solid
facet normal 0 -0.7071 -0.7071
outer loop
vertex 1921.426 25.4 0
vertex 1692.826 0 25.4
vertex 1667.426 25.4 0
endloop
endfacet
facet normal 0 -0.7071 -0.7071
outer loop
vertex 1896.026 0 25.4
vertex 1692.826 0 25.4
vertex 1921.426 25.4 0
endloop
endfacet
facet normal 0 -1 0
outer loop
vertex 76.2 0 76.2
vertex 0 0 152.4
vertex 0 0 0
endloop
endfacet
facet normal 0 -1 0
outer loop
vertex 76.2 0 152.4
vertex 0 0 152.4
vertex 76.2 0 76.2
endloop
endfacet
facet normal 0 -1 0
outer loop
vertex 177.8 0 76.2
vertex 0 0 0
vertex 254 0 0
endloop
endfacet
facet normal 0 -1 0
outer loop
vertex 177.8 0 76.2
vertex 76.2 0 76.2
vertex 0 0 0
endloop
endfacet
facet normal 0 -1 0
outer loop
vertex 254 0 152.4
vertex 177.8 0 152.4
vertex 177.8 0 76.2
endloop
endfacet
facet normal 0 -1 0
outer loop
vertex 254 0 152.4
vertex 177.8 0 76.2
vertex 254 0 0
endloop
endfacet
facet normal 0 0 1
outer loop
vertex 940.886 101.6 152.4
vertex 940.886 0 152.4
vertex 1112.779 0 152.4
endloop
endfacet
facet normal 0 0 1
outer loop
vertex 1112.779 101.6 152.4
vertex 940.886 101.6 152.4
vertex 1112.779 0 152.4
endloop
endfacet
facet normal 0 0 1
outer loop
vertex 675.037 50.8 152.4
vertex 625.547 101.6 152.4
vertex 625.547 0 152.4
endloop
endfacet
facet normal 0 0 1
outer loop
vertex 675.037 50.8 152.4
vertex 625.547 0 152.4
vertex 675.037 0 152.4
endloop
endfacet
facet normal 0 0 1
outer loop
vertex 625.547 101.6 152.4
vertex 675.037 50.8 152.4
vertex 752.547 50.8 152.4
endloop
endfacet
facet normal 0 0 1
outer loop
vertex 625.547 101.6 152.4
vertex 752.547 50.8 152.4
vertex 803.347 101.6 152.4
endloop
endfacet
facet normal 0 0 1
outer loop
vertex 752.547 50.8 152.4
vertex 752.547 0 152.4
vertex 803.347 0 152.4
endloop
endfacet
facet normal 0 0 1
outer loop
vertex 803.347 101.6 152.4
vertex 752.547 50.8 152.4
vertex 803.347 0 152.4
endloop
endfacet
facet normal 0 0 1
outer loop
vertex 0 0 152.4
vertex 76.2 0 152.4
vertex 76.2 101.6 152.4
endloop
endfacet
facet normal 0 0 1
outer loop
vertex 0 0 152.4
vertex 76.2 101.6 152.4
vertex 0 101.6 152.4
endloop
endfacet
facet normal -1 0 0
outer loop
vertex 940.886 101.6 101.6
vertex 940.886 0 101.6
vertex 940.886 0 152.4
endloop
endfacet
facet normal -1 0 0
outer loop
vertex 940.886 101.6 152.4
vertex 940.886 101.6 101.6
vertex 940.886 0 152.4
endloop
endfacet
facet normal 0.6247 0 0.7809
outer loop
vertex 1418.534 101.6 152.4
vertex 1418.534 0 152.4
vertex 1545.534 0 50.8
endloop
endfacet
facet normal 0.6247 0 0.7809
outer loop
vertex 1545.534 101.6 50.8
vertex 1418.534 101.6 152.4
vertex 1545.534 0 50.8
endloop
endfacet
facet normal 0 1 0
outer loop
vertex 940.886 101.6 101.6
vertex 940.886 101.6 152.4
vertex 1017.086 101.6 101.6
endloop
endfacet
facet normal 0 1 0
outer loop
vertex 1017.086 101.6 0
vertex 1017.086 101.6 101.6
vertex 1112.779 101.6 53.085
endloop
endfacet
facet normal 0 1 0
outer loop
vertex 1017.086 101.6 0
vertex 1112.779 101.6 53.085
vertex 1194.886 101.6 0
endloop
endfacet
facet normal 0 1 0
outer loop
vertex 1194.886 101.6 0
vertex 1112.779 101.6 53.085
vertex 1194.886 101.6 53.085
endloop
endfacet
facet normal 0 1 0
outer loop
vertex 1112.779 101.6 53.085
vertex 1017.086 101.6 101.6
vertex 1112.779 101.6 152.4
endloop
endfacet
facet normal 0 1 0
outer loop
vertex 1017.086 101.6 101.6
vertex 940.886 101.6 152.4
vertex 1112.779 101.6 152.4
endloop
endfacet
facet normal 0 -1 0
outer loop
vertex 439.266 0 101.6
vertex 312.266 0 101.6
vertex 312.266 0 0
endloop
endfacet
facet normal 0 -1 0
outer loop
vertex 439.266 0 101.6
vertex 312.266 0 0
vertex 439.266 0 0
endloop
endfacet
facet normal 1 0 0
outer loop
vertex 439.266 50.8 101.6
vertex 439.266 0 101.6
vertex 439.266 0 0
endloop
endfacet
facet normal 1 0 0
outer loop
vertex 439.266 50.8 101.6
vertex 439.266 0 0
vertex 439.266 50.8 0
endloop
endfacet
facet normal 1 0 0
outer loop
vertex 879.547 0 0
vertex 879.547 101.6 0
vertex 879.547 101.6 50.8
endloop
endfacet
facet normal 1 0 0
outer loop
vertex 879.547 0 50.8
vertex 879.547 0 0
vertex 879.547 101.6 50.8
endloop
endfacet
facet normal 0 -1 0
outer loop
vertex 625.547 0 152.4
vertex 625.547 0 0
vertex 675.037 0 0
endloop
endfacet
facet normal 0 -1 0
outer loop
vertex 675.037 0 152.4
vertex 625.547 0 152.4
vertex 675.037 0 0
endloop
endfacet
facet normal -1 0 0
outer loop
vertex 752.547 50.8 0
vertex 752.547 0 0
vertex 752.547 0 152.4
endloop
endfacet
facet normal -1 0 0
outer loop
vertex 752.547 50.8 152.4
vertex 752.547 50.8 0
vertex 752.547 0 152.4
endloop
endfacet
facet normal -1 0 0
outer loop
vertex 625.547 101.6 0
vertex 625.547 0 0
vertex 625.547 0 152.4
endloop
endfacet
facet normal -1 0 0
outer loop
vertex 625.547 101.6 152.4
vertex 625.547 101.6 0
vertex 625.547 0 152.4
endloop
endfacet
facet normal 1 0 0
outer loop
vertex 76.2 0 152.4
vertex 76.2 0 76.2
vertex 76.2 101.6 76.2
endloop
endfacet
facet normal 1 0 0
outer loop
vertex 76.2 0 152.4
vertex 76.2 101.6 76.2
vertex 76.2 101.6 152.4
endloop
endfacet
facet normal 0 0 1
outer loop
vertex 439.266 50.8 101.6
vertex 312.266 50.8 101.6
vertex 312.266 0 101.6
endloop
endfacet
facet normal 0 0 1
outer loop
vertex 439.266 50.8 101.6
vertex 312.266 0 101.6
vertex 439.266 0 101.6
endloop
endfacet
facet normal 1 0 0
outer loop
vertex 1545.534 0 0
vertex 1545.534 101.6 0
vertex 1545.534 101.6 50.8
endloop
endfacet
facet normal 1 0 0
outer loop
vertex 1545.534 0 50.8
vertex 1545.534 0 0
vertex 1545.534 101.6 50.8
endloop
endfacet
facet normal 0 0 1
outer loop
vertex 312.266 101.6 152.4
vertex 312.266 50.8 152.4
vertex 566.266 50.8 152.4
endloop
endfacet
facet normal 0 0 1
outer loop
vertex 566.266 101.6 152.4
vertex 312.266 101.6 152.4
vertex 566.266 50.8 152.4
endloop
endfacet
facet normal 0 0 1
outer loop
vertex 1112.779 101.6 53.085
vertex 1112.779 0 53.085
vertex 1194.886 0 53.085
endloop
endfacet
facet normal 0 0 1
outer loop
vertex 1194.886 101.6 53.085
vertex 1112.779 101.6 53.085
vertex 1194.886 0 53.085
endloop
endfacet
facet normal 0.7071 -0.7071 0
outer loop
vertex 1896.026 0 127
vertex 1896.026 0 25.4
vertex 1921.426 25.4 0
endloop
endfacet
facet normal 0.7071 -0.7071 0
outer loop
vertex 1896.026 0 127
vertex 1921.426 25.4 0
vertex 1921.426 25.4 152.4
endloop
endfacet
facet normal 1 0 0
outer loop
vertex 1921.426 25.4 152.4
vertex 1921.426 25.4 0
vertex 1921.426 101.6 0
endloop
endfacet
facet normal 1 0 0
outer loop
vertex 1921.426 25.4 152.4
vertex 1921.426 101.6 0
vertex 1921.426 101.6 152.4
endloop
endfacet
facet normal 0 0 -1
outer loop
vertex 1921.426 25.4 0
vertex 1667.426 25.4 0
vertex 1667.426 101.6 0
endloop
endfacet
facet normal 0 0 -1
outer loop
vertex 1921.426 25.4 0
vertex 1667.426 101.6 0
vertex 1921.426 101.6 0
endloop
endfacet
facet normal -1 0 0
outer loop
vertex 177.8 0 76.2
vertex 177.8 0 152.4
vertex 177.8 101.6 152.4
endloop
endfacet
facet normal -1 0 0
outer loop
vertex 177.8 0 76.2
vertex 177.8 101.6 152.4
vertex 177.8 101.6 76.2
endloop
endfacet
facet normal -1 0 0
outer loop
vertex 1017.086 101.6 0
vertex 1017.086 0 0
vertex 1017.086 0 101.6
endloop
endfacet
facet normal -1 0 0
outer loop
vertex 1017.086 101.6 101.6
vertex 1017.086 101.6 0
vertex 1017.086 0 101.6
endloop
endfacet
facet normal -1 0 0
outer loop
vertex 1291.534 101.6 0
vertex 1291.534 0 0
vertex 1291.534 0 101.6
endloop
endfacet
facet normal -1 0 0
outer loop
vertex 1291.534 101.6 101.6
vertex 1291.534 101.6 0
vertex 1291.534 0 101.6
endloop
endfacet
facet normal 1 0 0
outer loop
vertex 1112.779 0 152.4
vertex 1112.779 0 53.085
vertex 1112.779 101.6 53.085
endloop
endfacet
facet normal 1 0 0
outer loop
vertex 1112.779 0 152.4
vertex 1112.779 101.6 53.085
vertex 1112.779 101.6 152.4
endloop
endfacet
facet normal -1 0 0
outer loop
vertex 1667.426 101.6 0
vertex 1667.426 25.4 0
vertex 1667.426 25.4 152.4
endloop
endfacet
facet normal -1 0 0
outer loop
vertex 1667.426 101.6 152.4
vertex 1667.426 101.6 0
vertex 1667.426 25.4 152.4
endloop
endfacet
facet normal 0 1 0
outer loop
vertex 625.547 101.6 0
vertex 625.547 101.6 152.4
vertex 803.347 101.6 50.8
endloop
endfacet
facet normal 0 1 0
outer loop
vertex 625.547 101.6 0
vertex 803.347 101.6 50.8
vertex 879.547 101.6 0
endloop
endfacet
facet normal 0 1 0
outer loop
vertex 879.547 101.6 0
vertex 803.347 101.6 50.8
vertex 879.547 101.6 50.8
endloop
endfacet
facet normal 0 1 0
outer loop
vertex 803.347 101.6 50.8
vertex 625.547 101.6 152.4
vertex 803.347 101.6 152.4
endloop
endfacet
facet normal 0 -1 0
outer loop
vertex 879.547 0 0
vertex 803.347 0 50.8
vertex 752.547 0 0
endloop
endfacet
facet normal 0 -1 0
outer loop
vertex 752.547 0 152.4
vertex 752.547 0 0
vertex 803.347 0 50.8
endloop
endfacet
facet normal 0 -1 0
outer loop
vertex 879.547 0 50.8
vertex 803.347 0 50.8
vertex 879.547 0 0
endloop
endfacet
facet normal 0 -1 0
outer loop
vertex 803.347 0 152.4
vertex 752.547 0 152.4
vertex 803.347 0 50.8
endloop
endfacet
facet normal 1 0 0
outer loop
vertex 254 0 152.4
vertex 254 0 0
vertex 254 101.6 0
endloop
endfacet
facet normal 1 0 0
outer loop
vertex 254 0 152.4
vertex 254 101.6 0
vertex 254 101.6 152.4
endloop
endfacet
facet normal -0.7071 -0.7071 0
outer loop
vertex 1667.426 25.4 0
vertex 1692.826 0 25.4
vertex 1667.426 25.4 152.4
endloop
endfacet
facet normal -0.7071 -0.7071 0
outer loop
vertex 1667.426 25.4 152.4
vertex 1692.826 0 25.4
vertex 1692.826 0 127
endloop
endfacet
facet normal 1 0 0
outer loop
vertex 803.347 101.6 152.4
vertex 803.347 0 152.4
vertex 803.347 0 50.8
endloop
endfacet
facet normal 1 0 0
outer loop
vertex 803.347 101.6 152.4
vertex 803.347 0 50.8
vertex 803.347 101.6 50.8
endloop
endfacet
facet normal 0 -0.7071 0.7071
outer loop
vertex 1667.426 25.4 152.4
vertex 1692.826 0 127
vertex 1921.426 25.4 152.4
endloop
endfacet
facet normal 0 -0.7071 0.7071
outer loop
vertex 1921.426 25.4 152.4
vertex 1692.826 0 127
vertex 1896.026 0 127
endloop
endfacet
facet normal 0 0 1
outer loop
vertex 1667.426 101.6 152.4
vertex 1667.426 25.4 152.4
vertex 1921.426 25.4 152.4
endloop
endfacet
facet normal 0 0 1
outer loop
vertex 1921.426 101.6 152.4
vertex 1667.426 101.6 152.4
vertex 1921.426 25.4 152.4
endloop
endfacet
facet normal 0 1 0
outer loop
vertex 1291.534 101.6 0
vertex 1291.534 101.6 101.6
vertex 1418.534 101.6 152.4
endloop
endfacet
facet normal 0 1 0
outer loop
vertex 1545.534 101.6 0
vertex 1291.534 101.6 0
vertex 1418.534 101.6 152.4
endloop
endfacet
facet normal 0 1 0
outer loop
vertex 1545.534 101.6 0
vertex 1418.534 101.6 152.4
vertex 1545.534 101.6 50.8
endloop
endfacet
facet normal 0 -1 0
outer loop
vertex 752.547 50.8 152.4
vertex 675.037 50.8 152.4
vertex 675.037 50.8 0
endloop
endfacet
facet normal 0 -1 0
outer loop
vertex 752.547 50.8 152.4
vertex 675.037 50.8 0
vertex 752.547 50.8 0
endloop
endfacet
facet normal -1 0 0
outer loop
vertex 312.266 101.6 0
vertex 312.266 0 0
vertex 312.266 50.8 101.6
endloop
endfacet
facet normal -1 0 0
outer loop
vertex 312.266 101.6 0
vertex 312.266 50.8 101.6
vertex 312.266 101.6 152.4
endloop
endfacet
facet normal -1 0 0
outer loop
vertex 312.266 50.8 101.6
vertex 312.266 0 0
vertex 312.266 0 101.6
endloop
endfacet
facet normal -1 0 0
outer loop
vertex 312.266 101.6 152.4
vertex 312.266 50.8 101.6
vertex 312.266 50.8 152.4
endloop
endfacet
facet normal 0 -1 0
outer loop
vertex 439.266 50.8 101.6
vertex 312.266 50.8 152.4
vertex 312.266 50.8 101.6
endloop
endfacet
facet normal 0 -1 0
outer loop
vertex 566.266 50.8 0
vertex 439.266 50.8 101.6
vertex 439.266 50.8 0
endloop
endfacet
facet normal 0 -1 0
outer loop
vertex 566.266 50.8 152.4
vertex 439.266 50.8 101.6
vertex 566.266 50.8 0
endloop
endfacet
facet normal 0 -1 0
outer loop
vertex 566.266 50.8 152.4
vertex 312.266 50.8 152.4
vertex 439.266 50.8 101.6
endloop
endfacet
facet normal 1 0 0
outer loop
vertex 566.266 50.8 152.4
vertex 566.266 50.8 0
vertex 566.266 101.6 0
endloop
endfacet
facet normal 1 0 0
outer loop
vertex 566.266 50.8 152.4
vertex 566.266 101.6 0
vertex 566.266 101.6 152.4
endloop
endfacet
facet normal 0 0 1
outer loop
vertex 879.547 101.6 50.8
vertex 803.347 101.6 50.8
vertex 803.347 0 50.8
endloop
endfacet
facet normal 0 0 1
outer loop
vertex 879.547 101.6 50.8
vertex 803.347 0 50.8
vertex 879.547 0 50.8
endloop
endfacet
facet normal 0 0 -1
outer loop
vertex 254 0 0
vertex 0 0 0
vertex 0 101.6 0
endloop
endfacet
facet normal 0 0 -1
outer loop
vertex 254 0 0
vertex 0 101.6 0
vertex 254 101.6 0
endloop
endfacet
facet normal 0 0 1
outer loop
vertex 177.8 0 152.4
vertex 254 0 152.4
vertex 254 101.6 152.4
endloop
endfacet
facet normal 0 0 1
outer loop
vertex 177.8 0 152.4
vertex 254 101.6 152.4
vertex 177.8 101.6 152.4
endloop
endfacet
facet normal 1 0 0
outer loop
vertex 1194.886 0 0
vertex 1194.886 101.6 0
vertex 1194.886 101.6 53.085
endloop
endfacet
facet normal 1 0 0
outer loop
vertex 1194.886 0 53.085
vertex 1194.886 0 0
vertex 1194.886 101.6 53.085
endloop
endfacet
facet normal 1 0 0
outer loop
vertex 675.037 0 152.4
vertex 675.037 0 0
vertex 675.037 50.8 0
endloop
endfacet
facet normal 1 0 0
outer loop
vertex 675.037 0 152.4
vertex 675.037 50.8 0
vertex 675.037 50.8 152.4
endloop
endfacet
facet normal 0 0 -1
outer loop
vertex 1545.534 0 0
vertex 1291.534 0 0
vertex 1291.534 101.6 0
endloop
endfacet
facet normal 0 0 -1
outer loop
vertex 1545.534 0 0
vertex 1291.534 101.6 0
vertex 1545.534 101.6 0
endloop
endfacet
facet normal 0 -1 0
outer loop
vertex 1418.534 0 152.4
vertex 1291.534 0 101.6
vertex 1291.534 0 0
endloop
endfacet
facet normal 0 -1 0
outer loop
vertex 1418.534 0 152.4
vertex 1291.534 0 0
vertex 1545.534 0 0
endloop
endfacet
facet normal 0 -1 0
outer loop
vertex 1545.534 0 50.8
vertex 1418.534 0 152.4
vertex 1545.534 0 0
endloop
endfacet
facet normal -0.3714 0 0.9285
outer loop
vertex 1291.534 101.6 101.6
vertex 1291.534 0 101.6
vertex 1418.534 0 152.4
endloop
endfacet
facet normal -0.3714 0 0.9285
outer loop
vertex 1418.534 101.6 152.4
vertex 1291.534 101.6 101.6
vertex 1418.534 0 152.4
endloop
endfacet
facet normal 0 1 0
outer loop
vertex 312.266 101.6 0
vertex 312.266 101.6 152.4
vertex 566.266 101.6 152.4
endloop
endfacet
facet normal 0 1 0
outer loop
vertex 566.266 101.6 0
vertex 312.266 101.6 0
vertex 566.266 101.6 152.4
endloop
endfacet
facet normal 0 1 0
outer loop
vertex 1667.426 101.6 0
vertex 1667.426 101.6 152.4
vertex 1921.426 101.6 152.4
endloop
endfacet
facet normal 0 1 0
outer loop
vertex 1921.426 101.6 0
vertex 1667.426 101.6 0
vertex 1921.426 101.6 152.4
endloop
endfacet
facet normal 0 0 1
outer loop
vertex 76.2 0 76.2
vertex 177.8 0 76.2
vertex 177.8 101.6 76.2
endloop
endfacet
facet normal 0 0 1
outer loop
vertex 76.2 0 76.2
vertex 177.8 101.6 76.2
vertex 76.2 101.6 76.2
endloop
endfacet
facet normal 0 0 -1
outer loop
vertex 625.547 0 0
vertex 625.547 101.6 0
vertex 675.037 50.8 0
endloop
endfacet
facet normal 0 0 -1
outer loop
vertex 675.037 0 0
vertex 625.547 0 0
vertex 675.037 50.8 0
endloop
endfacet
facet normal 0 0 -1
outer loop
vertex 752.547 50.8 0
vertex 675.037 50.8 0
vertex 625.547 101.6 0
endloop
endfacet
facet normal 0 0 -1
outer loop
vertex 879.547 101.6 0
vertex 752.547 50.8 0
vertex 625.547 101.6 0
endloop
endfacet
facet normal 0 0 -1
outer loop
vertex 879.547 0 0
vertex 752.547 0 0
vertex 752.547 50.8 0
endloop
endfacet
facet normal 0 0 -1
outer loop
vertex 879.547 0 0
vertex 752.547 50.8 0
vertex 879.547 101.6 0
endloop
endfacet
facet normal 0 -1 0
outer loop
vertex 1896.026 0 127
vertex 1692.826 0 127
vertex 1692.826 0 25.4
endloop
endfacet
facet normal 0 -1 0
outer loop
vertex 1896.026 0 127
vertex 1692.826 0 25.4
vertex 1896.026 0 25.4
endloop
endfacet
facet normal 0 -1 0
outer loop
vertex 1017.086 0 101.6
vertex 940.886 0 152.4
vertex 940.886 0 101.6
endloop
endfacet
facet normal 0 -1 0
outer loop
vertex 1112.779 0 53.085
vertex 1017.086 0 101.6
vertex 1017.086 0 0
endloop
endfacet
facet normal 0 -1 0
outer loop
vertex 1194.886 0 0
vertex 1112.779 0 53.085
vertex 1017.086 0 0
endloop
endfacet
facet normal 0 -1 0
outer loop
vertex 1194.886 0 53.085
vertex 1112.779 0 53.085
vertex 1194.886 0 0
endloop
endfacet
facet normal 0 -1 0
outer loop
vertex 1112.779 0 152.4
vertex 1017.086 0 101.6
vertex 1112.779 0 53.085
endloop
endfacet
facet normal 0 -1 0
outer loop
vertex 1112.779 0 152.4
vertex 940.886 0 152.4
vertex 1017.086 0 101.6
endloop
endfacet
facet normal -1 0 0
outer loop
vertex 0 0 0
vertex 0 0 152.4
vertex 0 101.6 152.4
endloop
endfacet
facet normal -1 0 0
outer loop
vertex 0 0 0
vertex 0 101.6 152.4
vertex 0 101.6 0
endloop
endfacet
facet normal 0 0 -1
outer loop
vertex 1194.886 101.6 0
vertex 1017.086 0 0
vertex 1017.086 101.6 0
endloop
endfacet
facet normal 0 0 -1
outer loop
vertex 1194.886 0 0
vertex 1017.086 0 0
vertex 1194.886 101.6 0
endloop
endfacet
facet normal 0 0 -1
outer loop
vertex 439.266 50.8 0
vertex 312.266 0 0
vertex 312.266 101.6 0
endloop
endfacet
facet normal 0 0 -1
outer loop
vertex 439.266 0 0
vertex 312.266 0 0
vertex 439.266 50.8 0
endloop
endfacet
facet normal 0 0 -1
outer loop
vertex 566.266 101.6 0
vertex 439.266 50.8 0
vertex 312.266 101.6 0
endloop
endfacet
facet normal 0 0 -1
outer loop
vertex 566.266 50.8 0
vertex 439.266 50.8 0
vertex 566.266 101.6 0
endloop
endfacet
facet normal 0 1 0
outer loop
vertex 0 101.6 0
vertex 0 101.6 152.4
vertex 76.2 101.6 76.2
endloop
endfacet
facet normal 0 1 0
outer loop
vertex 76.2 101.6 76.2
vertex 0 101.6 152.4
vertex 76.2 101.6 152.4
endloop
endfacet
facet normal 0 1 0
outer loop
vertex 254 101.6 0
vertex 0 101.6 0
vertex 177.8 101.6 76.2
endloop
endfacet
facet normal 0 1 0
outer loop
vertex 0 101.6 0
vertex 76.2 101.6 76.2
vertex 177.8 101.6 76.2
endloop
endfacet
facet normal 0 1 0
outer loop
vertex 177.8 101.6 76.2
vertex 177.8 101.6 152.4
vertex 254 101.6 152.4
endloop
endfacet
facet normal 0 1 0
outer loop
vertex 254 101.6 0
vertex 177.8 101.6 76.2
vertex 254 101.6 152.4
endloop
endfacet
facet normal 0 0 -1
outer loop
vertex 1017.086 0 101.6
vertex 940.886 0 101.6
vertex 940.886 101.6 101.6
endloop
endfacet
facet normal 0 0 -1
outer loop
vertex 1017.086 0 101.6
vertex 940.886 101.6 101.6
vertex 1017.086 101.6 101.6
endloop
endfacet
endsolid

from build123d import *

# Parameters (mm, degrees)
F1_DEPTH  = 101.6
F2_W      = 254
F2_H      = 152.4
F3_DEPTH  = 101.6
F4_W      = 127
F4_H      = 50.8
F5_DEPTH  = 152.4
F7_W      = 127
F7_H      = 50.8
F8_DEPTH  = 50.8
F6_W      = 254
F6_H      = 152.4
F9_DEPTH  = 101.6
F10_W     = 76.2
F10_H     = 101.6
F11_DEPTH = 101.6
F12_W     = 77.5092818909
F12_H     = 152.4
F13_DEPTH = 50.8
F14_W     = 254
F14_H     = 152.4
F15_DEPTH = 101.6
F16_W     = 76.2
F16_H     = 101.6
F17_DEPTH = 101.6
F18_W     = 82.1068286896
F18_H     = 99.315268898
F19_DEPTH = 101.6
F20_W     = 254
F20_H     = 152.4
F21_DEPTH = 101.6
F23_DEPTH = 101.6
F25_DEPTH = 101.6
F26_W     = 254
F26_H     = 152.4
F27_DEPTH = 101.6
F28_SIZE  = 25.4


with BuildPart() as f1:
    # F0 (on Front) → F1 (new body)
    with BuildSketch(Plane.XZ):
        Polygon((0, 152.4), (0, 0), (254, 0), (254, 152.4), (177.8, 152.4), (177.8, 76.2), (76.2, 76.2), (76.2, 152.4), align=None)
    extrude(amount=-F1_DEPTH)


with BuildPart() as f3:
    # F2 (on face) → F3 (new body)
    with BuildSketch(Plane.XZ):
        with Locations((439.2663795948, 76.2)):
            Rectangle(F2_W, F2_H)
    extrude(amount=-F3_DEPTH)

    # F4 (on face) → F5 (cut)
    with BuildSketch(Plane.XY.offset(152.4)):
        with Locations((502.7663795948, 25.4)):
            Rectangle(F4_W, F4_H)
    extrude(amount=-F5_DEPTH, mode=Mode.SUBTRACT)

    # F7 (on face) → F8 (cut)
    with BuildSketch(Plane.XY.offset(152.4)):
        with Locations((375.7663795948, 25.4)):
            Rectangle(F7_W, F7_H)
    extrude(amount=-F8_DEPTH, mode=Mode.SUBTRACT)


with BuildPart() as f9:
    # F6 (on face) → F9 (new body)
    with BuildSketch(Plane.XZ):
        with Locations((752.5466659241, 76.2)):
            Rectangle(F6_W, F6_H)
    extrude(amount=-F9_DEPTH)

    # F10 (on face) → F11 (cut)
    with BuildSketch(Plane.XY.offset(152.4)):
        with Locations((841.4466659241, 50.8)):
            Rectangle(F10_W, F10_H)
    extrude(amount=-F11_DEPTH, mode=Mode.SUBTRACT)

    # F12 (on face) → F13 (cut)
    with BuildSketch(Plane.XZ):
        with Locations((713.7920249786, 76.2)):
            Rectangle(F12_W, F12_H)
    extrude(amount=-F13_DEPTH, mode=Mode.SUBTRACT)


with BuildPart() as f15:
    # F14 (on face) → F15 (new body)
    with BuildSketch(Plane.XZ):
        with Locations((1067.8858499527, 76.2)):
            Rectangle(F14_W, F14_H)
    extrude(amount=-F15_DEPTH)

    # F16 (on face) → F17 (cut)
    with BuildSketch(Plane.XZ):
        with Locations((978.9858499527, 50.8)):
            Rectangle(F16_W, F16_H)
    extrude(amount=-F17_DEPTH, mode=Mode.SUBTRACT)

    # F18 (on face) → F19 (cut)
    with BuildSketch(Plane.XZ):
        with Locations((1153.8324356079, 102.742365551)):
            Rectangle(F18_W, F18_H)
    extrude(amount=-F19_DEPTH, mode=Mode.SUBTRACT)


with BuildPart() as f21:
    # F20 (on face) → F21 (new body)
    with BuildSketch(Plane.XZ):
        with Locations((1418.5344781153, 76.2)):
            Rectangle(F20_W, F20_H)
    extrude(amount=-F21_DEPTH)

    # F22 (on face) → F23 (cut)
    with BuildSketch(Plane.XZ):
        Polygon((1291.5344781153, 152.4), (1291.5344781153, 101.6), (1418.5344781153, 152.4), align=None)
    extrude(amount=-F23_DEPTH, mode=Mode.SUBTRACT)

    # F24 (on face) → F25 (cut)
    with BuildSketch(Plane.XZ):
        Polygon((1418.5344781153, 152.4), (1545.5344781153, 50.8), (1545.5344781153, 152.4), align=None)
    extrude(amount=-F25_DEPTH, mode=Mode.SUBTRACT)


with BuildPart() as f27:
    # F26 (on face) → F27 (new body)
    with BuildSketch(Plane.XZ):
        with Locations((1794.4256044602, 76.2)):
            Rectangle(F26_W, F26_H)
    extrude(amount=-F27_DEPTH)

    # F28
    f28_edges = [f27.edges().sort_by_distance(p)[0] for p in [
        (1667.425604, 0, 76.2),
        (1794.425604, 0, 0),
        (1921.425604, 0, 76.2),
        (1794.425604, 0, 152.4),
    ]]
    chamfer(f28_edges, length=F28_SIZE)


solid = Compound([f1.part, f3.part, f9.part, f15.part, f21.part, f27.part])
